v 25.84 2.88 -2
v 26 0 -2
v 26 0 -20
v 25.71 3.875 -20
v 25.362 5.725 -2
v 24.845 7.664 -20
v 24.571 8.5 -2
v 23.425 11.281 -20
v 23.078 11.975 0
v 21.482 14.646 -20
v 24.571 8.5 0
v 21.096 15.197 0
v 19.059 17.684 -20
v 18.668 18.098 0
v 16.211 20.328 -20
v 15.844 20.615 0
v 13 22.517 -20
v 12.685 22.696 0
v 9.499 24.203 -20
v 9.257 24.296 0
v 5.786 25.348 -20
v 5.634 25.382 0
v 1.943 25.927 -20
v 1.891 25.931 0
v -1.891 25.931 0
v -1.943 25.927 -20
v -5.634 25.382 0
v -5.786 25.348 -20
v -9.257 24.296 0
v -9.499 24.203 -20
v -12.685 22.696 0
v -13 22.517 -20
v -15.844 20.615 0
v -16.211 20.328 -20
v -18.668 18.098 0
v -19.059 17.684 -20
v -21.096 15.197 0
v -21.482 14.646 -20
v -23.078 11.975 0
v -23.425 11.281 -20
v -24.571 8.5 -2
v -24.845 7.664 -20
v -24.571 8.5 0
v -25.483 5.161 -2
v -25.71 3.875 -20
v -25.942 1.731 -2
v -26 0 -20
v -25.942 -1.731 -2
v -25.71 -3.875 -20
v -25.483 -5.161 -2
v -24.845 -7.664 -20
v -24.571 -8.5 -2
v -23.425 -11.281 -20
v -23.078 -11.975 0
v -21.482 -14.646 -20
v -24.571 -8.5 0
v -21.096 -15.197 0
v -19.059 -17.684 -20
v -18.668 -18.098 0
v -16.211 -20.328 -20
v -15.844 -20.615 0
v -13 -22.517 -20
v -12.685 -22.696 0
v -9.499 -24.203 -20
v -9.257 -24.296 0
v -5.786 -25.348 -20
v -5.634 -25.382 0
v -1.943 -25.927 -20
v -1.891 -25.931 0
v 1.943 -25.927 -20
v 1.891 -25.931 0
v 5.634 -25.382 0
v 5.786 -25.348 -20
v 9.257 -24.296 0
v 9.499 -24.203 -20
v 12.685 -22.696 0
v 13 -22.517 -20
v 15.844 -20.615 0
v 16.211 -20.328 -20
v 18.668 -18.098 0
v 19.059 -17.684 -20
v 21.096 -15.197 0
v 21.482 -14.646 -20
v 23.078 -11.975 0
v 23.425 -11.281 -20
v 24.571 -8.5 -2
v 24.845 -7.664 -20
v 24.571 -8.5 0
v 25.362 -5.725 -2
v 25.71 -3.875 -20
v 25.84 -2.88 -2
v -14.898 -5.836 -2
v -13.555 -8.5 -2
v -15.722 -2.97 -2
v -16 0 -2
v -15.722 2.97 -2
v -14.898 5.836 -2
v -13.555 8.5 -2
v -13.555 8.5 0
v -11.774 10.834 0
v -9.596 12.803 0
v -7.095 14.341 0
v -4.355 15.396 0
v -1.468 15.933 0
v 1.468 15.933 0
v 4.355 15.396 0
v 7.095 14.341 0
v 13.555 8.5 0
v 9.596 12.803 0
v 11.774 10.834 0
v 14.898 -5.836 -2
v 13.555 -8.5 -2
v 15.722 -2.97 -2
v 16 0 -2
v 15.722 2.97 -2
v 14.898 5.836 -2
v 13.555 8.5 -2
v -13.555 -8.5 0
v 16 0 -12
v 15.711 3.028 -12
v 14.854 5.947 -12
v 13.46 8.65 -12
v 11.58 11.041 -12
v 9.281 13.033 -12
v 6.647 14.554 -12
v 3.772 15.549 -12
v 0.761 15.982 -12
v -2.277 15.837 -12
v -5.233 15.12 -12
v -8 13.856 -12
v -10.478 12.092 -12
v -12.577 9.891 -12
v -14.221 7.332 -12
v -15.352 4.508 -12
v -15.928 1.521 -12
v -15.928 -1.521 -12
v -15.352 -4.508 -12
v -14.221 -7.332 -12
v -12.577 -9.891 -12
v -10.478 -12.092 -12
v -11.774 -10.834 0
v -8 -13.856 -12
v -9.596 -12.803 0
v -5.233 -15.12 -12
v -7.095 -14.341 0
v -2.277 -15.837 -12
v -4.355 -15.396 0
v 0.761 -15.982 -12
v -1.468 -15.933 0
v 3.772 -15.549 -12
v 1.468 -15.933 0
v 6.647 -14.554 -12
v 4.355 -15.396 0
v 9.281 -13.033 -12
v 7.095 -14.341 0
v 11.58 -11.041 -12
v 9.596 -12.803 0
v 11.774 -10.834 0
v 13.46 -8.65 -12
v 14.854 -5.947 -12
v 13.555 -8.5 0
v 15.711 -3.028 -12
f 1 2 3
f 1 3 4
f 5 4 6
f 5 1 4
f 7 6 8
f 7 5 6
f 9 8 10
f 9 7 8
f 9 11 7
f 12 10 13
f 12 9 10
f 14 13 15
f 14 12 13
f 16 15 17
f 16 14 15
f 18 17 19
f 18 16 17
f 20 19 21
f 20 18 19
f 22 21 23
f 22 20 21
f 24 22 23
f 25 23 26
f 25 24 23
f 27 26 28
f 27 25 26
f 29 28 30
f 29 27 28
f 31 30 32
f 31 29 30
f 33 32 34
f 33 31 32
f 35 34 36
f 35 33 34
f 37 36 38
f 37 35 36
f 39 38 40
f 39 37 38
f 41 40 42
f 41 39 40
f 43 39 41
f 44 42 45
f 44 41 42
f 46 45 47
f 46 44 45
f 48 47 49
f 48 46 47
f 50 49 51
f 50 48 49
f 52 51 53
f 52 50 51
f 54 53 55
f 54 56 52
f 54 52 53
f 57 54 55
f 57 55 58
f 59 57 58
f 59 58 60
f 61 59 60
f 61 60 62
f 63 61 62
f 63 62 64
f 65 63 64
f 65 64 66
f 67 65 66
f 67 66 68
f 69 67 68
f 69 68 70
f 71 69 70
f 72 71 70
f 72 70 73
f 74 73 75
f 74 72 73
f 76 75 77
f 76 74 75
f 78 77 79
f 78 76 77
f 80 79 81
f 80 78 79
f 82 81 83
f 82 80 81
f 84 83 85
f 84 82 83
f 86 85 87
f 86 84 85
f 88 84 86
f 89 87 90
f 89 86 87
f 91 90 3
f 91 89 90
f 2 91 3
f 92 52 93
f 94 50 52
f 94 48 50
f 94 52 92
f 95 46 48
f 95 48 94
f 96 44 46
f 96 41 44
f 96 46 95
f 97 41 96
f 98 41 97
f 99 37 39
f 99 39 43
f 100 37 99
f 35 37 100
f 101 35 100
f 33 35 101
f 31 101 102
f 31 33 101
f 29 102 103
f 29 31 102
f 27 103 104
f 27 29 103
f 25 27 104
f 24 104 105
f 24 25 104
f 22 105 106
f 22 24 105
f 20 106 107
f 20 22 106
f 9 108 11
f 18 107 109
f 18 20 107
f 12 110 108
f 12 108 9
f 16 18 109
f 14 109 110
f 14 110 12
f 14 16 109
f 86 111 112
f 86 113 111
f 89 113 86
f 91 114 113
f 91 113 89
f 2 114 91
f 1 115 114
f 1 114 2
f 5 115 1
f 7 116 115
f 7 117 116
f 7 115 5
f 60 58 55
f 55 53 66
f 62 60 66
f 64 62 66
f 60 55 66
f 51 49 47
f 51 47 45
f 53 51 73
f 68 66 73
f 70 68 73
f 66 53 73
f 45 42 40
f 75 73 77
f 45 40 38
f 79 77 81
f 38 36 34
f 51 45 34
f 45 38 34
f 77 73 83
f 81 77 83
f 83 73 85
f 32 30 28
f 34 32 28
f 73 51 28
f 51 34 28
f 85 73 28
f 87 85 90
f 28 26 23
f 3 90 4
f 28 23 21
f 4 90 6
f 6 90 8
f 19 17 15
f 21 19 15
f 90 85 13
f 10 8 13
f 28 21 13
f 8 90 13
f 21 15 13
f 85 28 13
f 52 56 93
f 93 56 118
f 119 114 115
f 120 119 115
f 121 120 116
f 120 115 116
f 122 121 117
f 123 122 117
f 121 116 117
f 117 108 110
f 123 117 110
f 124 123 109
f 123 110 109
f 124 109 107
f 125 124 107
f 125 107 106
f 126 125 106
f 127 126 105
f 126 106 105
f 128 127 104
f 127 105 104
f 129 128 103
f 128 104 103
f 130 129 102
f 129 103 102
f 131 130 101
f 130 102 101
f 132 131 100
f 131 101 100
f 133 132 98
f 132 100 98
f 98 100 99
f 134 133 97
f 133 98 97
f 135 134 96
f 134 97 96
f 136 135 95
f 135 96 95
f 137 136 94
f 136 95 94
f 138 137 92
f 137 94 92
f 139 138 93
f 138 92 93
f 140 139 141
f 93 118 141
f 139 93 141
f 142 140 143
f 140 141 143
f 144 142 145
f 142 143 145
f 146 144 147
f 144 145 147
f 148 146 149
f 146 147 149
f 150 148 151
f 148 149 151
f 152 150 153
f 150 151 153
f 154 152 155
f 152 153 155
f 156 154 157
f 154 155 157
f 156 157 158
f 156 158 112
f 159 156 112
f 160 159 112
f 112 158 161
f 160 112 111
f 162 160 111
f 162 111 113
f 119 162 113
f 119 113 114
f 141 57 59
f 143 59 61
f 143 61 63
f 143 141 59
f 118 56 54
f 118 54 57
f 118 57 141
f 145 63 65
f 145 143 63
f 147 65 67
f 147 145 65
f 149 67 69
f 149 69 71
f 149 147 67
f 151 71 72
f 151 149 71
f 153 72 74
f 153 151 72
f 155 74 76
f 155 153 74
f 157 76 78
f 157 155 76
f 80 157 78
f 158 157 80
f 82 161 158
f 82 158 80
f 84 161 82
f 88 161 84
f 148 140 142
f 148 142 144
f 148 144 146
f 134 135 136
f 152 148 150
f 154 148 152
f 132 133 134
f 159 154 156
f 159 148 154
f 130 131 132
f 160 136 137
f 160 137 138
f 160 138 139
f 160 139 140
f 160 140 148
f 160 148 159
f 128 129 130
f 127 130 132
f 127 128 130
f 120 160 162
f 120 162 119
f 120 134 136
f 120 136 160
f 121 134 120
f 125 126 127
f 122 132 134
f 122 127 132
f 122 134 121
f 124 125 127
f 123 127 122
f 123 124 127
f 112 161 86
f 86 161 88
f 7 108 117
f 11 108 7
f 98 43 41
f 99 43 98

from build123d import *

# Parameters (mm, degrees)
F0_R     = 26
F0_R_2   = 16
F1_DEPTH = 20
F2_DEPTH = 12
F3_W     = 52
F3_H     = 17
F4_DEPTH = 2


with BuildPart() as f1:
    # F0 (on Top) → F1 (new body)
    with BuildSketch(Plane.XY):
        Circle(F0_R)
        Circle(F0_R_2, mode=Mode.SUBTRACT)
        Circle(F0_R_2)
    extrude(amount=-F1_DEPTH)

    # F0 (on Top) → F2 (cut)
    with BuildSketch(Plane.XY):
        Circle(F0_R_2)
    extrude(amount=-F2_DEPTH, mode=Mode.SUBTRACT)

    # F3 (on Top) → F4 (cut)
    with BuildSketch(Plane.XY):
        Rectangle(F3_W, F3_H)
    extrude(amount=-F4_DEPTH, mode=Mode.SUBTRACT)


solid = f1.part
